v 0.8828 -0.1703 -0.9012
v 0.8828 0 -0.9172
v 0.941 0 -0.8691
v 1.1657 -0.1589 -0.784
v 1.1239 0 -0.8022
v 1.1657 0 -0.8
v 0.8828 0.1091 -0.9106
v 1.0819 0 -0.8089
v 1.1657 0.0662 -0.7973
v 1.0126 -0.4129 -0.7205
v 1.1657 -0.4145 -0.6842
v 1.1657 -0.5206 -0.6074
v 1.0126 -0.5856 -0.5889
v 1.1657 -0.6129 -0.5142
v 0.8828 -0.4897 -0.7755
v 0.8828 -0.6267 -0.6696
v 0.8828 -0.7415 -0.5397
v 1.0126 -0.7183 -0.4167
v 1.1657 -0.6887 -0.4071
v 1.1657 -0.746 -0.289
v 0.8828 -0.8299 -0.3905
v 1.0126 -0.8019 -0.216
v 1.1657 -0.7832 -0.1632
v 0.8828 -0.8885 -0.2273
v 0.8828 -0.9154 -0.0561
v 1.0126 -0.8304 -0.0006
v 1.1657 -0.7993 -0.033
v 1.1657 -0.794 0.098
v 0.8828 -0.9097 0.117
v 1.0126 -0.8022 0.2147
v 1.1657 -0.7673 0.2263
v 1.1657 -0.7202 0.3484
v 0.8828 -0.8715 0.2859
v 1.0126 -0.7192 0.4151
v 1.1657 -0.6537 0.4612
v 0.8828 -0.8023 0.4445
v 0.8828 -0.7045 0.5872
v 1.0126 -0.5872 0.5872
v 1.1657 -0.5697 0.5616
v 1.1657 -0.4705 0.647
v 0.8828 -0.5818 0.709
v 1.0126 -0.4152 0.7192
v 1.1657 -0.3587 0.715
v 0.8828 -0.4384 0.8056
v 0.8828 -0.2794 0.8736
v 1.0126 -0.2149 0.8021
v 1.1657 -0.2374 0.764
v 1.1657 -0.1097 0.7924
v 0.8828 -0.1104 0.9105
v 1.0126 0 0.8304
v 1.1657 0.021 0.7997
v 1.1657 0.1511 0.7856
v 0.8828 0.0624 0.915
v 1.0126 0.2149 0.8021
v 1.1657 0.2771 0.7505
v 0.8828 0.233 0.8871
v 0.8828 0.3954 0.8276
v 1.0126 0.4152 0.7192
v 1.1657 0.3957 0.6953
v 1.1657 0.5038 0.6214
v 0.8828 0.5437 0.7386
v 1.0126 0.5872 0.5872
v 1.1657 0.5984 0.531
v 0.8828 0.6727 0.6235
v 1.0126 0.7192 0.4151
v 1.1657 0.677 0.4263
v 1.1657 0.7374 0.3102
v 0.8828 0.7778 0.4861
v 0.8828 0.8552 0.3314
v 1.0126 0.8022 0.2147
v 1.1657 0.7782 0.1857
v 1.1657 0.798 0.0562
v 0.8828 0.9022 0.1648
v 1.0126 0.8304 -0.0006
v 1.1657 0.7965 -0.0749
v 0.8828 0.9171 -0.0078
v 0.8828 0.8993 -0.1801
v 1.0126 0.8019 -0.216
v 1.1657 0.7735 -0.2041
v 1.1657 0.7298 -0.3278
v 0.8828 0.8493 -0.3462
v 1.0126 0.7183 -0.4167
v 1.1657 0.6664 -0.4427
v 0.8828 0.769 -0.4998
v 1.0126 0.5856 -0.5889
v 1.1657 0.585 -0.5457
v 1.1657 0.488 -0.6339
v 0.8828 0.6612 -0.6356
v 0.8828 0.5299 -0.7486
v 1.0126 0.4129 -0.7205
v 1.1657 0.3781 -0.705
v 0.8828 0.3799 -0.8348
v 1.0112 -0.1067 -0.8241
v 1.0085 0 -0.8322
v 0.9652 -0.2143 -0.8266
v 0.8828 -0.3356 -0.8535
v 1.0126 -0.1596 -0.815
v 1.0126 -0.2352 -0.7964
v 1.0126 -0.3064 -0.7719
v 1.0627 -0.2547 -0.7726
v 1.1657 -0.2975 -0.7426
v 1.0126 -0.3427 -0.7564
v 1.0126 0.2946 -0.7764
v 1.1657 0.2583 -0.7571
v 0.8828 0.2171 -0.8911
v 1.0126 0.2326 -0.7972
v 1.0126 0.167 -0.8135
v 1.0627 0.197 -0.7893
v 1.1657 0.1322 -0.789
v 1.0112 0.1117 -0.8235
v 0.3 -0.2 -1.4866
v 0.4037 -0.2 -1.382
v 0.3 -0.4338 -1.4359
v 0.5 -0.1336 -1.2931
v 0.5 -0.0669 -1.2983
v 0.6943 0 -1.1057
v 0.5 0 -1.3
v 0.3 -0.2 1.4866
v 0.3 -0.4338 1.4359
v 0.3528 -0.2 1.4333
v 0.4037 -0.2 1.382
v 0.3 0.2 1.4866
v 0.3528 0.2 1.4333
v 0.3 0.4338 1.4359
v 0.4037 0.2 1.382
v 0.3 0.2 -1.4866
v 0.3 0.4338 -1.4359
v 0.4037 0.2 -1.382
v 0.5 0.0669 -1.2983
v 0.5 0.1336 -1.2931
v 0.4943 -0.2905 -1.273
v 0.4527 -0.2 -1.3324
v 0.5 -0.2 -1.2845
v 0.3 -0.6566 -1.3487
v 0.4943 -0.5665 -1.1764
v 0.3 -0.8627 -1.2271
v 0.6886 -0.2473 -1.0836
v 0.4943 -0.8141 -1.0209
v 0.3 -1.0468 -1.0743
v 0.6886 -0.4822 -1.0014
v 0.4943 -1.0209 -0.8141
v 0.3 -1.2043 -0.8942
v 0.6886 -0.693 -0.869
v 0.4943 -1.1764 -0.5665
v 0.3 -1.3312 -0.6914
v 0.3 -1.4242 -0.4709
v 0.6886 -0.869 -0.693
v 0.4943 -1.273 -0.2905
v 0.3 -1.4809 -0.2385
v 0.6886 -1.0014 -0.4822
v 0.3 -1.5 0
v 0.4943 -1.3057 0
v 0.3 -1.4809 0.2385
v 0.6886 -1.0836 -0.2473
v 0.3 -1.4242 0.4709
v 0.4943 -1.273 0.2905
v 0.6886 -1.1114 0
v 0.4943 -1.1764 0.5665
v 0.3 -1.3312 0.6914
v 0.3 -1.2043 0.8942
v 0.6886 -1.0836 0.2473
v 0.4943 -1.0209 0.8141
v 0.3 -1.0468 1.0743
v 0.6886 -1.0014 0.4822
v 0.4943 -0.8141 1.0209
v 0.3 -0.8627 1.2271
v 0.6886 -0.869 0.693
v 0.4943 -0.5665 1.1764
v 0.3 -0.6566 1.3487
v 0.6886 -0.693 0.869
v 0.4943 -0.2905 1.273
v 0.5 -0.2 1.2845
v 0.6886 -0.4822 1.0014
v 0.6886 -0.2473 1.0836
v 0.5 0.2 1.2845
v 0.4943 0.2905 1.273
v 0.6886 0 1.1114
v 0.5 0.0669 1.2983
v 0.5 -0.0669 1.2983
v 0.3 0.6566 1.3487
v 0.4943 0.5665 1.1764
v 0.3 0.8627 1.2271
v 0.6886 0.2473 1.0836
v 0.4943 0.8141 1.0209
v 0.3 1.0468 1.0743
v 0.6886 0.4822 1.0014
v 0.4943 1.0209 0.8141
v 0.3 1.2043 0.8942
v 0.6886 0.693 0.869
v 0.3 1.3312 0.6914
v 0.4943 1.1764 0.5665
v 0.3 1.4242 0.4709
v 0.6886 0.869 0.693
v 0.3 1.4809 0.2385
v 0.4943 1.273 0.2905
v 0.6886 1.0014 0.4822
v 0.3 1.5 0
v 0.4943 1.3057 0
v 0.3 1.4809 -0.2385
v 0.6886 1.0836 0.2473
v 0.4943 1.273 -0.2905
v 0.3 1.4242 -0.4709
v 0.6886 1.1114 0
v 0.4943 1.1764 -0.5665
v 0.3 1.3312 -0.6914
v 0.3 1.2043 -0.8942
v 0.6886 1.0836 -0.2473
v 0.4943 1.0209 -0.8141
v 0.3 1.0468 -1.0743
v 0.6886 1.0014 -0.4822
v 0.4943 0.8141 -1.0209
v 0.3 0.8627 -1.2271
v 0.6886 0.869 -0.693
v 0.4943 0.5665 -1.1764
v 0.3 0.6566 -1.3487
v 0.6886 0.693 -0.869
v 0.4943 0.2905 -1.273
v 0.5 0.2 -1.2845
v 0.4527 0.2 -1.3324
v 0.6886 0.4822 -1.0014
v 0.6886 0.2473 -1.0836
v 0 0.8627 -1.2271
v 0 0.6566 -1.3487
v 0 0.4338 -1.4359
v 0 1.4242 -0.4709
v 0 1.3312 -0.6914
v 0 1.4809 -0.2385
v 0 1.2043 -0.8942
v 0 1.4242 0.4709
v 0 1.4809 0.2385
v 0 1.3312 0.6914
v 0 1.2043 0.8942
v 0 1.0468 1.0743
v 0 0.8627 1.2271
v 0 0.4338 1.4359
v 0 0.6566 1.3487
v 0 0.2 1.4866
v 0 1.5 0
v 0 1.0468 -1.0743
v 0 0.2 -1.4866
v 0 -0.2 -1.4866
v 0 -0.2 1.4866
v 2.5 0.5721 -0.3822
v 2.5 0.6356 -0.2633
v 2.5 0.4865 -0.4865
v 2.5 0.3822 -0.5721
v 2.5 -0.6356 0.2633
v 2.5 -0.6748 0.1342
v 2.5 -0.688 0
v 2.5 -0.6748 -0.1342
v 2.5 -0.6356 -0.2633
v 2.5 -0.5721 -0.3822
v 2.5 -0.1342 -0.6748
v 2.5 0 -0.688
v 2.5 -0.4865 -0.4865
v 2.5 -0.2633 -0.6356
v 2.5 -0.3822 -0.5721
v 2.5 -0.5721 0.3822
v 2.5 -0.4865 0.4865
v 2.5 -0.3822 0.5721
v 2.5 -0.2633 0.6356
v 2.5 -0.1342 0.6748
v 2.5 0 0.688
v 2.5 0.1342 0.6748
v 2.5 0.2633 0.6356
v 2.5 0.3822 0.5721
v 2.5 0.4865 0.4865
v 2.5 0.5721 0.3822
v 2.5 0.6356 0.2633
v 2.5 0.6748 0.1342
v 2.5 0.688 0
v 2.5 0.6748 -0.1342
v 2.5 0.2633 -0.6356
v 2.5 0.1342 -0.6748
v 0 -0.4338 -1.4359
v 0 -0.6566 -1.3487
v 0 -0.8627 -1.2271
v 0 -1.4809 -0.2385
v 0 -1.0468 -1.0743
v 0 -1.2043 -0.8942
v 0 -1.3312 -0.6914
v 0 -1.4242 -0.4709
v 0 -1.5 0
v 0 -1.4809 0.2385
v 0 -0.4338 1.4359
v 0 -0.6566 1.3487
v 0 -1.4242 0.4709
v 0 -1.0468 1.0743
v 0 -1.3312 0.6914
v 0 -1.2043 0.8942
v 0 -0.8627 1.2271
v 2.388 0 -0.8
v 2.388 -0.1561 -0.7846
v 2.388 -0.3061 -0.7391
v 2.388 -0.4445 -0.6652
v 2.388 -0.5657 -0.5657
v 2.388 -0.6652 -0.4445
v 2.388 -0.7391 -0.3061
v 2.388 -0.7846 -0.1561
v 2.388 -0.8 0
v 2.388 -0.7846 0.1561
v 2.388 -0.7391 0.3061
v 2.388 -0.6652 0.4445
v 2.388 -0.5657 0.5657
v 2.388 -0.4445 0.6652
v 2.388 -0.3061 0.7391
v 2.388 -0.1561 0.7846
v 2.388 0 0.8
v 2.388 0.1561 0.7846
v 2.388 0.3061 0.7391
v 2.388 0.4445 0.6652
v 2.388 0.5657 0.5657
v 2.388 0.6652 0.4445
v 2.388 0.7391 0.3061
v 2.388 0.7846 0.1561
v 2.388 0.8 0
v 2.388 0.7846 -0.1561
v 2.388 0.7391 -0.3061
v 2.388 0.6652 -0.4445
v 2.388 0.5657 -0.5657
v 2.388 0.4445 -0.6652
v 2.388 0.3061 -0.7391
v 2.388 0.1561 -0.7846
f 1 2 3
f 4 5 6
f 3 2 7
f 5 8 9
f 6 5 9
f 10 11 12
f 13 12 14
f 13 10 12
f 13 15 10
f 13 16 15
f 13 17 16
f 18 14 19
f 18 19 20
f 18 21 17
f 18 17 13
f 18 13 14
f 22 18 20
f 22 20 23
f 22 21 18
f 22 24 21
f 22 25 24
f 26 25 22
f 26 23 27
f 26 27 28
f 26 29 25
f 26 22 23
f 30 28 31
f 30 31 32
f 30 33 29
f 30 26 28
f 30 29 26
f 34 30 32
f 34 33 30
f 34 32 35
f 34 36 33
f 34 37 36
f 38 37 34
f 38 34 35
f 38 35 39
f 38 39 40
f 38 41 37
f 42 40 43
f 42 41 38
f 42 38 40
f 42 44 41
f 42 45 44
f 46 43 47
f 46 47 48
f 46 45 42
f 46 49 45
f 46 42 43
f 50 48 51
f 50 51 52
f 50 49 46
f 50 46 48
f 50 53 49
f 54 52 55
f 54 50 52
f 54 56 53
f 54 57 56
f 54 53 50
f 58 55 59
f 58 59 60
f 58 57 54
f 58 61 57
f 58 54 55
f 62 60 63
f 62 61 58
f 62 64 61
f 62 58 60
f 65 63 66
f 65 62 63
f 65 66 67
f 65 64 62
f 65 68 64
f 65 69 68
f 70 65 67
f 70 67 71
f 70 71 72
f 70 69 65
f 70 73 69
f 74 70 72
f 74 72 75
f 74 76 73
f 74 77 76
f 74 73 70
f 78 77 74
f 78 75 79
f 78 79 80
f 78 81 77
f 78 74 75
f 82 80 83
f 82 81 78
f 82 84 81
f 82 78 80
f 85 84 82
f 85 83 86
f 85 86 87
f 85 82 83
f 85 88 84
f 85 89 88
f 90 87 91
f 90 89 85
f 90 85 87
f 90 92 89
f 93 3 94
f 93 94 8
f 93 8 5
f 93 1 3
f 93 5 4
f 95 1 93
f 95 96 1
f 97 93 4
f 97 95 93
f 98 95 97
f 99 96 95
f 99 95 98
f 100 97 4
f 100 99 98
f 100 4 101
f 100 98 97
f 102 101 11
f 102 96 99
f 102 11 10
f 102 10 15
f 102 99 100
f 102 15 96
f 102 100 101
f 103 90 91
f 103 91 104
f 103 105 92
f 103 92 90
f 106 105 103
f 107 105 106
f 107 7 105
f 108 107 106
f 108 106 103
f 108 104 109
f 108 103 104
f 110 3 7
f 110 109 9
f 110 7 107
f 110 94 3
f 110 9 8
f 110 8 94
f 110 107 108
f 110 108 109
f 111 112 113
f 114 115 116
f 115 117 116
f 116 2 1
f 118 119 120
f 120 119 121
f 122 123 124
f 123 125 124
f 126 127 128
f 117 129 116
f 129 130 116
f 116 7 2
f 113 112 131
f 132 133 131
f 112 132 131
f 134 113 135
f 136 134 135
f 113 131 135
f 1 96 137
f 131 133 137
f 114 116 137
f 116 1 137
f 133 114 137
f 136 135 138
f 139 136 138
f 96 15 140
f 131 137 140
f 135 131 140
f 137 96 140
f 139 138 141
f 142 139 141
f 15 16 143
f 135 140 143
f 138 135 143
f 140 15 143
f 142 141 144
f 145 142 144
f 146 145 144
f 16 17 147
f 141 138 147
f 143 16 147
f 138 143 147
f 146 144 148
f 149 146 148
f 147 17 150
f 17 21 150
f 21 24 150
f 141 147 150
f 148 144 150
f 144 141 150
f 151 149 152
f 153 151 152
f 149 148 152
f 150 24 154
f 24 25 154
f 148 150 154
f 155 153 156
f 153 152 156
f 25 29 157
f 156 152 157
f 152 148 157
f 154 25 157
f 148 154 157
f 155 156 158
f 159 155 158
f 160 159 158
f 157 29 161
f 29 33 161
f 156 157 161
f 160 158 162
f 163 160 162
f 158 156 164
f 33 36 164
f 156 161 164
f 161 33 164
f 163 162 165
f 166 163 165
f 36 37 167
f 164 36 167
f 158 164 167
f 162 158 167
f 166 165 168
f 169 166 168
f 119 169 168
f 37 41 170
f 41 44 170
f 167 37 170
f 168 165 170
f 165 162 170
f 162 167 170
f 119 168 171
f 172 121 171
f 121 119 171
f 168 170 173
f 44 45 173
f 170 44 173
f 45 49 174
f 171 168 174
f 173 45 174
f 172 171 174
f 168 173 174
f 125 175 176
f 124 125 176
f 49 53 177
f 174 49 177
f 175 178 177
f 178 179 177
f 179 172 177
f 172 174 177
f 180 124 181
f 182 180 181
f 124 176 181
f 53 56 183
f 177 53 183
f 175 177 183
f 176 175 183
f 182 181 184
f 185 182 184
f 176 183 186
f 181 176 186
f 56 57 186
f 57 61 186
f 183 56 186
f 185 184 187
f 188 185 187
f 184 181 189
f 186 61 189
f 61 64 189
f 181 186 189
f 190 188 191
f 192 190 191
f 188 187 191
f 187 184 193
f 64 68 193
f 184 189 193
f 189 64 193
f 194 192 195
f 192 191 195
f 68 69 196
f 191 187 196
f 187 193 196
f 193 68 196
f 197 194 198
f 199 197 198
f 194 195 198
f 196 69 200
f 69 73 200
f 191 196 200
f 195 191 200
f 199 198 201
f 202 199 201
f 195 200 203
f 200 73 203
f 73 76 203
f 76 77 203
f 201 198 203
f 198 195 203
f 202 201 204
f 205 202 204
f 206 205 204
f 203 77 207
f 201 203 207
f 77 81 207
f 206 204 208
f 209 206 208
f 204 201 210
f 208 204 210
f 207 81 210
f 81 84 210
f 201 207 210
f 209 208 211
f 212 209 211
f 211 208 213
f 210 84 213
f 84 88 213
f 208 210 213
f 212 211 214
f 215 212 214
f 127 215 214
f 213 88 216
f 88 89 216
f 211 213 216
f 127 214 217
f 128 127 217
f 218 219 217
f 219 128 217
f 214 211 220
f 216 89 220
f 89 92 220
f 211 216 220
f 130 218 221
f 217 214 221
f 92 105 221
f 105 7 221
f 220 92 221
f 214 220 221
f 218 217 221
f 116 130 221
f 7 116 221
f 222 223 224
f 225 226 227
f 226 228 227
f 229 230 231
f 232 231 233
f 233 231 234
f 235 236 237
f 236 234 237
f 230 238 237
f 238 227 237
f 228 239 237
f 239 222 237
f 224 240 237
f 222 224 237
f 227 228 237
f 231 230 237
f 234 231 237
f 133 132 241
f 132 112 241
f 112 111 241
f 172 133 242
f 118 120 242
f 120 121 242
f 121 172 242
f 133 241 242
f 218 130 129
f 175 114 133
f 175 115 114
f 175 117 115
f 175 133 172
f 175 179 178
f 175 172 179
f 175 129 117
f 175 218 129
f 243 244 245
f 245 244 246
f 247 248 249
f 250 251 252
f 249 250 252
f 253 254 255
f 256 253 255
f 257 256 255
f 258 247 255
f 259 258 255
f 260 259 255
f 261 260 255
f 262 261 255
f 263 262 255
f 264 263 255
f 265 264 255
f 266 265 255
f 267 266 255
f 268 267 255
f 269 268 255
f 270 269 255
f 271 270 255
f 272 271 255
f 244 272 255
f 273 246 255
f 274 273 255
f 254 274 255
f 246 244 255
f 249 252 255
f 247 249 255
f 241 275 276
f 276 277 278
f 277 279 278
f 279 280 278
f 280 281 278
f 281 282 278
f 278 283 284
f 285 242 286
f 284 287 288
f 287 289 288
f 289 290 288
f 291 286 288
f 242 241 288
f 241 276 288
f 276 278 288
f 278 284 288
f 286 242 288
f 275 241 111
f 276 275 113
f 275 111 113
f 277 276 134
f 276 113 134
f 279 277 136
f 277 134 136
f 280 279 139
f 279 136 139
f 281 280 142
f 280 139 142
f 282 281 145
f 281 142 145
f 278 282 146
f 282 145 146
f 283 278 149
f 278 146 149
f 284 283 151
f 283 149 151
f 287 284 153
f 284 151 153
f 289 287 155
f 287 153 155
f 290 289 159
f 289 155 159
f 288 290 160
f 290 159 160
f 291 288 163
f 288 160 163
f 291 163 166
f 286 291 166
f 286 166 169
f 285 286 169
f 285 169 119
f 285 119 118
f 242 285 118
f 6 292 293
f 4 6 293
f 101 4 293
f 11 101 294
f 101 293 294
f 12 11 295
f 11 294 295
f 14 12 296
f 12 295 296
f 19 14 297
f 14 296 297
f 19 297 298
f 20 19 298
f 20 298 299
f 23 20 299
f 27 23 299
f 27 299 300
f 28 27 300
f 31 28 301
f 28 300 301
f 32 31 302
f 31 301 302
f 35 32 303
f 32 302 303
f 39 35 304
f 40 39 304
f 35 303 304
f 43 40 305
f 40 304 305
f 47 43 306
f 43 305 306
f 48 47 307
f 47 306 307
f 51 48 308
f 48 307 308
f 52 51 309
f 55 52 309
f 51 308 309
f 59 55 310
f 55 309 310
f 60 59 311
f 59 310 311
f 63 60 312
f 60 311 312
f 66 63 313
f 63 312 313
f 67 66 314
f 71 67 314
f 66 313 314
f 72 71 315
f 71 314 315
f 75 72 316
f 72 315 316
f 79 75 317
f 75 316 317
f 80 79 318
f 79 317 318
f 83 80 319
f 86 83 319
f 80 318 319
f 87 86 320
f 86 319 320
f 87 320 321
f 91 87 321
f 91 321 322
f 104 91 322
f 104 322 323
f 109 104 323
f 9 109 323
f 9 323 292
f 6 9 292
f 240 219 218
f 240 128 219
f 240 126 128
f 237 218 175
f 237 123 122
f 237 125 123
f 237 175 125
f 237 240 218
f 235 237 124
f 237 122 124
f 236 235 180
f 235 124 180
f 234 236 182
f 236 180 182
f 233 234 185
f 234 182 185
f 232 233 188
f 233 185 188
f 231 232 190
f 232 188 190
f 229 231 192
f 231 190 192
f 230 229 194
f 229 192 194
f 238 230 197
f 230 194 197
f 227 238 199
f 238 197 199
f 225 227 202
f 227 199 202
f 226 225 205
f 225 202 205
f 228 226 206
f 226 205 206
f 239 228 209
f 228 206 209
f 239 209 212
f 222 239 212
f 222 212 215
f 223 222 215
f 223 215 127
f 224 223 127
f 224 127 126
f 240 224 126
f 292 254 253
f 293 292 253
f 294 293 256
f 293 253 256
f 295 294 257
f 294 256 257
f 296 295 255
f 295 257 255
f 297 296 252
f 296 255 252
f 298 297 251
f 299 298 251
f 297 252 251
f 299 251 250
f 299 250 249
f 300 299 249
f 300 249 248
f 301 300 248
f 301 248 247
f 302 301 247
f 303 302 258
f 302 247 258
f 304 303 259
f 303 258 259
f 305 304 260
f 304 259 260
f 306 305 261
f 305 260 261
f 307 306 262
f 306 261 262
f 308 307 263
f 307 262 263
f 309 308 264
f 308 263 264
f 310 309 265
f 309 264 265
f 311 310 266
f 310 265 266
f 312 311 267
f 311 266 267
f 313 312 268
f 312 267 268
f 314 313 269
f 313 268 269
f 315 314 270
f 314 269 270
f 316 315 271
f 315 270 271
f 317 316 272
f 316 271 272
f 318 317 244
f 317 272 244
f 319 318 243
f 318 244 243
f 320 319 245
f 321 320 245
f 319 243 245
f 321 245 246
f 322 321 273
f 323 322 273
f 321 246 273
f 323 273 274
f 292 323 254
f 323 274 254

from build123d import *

# Parameters (mm, degrees)
ZAOBLIT1_R               = 0.4
ZKOSIT1_SIZE             = 0.112
SKICA2_W                 = 3
SKICA2_H                 = 0.4
ODEBRAT_VYSUNUT_M1_DEPTH = 0.5


with BuildPart() as part:
    # Skica1 → Otočit kolem osy1 (revolve)
    with BuildSketch(Plane.XY, mode=Mode.PRIVATE) as oto_it_kolem_osy1_sk:
        Polygon((0, 0), (0, 1.5), (0.3, 1.5), (1, 0.8), (2.5, 0.8), (2.5, 0), align=None)
    revolve(oto_it_kolem_osy1_sk.sketch.rotate(Axis((0, 0, 0), (-1, 0, 0)), 90), axis=Axis((0, 0, 0), (-1, 0, 0)))

    # Zaoblit1
    zaoblit1_edges = [part.edges().sort_by_distance(p)[0] for p in [
        (1, 0, 0.8),
    ]]
    fillet(zaoblit1_edges, radius=ZAOBLIT1_R)

    # Zkosit1
    zkosit1_edges = [part.edges().sort_by_distance(p)[0] for p in [
        (2.5, 0, 0.8),
    ]]
    chamfer(zkosit1_edges, length=ZKOSIT1_SIZE)

    # Skica2 → Odebrat vysunutím1 (cut)
    with BuildSketch(Plane.ZY):
        Rectangle(SKICA2_W, SKICA2_H)
    extrude(amount=-ODEBRAT_VYSUNUT_M1_DEPTH, mode=Mode.SUBTRACT)


solid = part.part
